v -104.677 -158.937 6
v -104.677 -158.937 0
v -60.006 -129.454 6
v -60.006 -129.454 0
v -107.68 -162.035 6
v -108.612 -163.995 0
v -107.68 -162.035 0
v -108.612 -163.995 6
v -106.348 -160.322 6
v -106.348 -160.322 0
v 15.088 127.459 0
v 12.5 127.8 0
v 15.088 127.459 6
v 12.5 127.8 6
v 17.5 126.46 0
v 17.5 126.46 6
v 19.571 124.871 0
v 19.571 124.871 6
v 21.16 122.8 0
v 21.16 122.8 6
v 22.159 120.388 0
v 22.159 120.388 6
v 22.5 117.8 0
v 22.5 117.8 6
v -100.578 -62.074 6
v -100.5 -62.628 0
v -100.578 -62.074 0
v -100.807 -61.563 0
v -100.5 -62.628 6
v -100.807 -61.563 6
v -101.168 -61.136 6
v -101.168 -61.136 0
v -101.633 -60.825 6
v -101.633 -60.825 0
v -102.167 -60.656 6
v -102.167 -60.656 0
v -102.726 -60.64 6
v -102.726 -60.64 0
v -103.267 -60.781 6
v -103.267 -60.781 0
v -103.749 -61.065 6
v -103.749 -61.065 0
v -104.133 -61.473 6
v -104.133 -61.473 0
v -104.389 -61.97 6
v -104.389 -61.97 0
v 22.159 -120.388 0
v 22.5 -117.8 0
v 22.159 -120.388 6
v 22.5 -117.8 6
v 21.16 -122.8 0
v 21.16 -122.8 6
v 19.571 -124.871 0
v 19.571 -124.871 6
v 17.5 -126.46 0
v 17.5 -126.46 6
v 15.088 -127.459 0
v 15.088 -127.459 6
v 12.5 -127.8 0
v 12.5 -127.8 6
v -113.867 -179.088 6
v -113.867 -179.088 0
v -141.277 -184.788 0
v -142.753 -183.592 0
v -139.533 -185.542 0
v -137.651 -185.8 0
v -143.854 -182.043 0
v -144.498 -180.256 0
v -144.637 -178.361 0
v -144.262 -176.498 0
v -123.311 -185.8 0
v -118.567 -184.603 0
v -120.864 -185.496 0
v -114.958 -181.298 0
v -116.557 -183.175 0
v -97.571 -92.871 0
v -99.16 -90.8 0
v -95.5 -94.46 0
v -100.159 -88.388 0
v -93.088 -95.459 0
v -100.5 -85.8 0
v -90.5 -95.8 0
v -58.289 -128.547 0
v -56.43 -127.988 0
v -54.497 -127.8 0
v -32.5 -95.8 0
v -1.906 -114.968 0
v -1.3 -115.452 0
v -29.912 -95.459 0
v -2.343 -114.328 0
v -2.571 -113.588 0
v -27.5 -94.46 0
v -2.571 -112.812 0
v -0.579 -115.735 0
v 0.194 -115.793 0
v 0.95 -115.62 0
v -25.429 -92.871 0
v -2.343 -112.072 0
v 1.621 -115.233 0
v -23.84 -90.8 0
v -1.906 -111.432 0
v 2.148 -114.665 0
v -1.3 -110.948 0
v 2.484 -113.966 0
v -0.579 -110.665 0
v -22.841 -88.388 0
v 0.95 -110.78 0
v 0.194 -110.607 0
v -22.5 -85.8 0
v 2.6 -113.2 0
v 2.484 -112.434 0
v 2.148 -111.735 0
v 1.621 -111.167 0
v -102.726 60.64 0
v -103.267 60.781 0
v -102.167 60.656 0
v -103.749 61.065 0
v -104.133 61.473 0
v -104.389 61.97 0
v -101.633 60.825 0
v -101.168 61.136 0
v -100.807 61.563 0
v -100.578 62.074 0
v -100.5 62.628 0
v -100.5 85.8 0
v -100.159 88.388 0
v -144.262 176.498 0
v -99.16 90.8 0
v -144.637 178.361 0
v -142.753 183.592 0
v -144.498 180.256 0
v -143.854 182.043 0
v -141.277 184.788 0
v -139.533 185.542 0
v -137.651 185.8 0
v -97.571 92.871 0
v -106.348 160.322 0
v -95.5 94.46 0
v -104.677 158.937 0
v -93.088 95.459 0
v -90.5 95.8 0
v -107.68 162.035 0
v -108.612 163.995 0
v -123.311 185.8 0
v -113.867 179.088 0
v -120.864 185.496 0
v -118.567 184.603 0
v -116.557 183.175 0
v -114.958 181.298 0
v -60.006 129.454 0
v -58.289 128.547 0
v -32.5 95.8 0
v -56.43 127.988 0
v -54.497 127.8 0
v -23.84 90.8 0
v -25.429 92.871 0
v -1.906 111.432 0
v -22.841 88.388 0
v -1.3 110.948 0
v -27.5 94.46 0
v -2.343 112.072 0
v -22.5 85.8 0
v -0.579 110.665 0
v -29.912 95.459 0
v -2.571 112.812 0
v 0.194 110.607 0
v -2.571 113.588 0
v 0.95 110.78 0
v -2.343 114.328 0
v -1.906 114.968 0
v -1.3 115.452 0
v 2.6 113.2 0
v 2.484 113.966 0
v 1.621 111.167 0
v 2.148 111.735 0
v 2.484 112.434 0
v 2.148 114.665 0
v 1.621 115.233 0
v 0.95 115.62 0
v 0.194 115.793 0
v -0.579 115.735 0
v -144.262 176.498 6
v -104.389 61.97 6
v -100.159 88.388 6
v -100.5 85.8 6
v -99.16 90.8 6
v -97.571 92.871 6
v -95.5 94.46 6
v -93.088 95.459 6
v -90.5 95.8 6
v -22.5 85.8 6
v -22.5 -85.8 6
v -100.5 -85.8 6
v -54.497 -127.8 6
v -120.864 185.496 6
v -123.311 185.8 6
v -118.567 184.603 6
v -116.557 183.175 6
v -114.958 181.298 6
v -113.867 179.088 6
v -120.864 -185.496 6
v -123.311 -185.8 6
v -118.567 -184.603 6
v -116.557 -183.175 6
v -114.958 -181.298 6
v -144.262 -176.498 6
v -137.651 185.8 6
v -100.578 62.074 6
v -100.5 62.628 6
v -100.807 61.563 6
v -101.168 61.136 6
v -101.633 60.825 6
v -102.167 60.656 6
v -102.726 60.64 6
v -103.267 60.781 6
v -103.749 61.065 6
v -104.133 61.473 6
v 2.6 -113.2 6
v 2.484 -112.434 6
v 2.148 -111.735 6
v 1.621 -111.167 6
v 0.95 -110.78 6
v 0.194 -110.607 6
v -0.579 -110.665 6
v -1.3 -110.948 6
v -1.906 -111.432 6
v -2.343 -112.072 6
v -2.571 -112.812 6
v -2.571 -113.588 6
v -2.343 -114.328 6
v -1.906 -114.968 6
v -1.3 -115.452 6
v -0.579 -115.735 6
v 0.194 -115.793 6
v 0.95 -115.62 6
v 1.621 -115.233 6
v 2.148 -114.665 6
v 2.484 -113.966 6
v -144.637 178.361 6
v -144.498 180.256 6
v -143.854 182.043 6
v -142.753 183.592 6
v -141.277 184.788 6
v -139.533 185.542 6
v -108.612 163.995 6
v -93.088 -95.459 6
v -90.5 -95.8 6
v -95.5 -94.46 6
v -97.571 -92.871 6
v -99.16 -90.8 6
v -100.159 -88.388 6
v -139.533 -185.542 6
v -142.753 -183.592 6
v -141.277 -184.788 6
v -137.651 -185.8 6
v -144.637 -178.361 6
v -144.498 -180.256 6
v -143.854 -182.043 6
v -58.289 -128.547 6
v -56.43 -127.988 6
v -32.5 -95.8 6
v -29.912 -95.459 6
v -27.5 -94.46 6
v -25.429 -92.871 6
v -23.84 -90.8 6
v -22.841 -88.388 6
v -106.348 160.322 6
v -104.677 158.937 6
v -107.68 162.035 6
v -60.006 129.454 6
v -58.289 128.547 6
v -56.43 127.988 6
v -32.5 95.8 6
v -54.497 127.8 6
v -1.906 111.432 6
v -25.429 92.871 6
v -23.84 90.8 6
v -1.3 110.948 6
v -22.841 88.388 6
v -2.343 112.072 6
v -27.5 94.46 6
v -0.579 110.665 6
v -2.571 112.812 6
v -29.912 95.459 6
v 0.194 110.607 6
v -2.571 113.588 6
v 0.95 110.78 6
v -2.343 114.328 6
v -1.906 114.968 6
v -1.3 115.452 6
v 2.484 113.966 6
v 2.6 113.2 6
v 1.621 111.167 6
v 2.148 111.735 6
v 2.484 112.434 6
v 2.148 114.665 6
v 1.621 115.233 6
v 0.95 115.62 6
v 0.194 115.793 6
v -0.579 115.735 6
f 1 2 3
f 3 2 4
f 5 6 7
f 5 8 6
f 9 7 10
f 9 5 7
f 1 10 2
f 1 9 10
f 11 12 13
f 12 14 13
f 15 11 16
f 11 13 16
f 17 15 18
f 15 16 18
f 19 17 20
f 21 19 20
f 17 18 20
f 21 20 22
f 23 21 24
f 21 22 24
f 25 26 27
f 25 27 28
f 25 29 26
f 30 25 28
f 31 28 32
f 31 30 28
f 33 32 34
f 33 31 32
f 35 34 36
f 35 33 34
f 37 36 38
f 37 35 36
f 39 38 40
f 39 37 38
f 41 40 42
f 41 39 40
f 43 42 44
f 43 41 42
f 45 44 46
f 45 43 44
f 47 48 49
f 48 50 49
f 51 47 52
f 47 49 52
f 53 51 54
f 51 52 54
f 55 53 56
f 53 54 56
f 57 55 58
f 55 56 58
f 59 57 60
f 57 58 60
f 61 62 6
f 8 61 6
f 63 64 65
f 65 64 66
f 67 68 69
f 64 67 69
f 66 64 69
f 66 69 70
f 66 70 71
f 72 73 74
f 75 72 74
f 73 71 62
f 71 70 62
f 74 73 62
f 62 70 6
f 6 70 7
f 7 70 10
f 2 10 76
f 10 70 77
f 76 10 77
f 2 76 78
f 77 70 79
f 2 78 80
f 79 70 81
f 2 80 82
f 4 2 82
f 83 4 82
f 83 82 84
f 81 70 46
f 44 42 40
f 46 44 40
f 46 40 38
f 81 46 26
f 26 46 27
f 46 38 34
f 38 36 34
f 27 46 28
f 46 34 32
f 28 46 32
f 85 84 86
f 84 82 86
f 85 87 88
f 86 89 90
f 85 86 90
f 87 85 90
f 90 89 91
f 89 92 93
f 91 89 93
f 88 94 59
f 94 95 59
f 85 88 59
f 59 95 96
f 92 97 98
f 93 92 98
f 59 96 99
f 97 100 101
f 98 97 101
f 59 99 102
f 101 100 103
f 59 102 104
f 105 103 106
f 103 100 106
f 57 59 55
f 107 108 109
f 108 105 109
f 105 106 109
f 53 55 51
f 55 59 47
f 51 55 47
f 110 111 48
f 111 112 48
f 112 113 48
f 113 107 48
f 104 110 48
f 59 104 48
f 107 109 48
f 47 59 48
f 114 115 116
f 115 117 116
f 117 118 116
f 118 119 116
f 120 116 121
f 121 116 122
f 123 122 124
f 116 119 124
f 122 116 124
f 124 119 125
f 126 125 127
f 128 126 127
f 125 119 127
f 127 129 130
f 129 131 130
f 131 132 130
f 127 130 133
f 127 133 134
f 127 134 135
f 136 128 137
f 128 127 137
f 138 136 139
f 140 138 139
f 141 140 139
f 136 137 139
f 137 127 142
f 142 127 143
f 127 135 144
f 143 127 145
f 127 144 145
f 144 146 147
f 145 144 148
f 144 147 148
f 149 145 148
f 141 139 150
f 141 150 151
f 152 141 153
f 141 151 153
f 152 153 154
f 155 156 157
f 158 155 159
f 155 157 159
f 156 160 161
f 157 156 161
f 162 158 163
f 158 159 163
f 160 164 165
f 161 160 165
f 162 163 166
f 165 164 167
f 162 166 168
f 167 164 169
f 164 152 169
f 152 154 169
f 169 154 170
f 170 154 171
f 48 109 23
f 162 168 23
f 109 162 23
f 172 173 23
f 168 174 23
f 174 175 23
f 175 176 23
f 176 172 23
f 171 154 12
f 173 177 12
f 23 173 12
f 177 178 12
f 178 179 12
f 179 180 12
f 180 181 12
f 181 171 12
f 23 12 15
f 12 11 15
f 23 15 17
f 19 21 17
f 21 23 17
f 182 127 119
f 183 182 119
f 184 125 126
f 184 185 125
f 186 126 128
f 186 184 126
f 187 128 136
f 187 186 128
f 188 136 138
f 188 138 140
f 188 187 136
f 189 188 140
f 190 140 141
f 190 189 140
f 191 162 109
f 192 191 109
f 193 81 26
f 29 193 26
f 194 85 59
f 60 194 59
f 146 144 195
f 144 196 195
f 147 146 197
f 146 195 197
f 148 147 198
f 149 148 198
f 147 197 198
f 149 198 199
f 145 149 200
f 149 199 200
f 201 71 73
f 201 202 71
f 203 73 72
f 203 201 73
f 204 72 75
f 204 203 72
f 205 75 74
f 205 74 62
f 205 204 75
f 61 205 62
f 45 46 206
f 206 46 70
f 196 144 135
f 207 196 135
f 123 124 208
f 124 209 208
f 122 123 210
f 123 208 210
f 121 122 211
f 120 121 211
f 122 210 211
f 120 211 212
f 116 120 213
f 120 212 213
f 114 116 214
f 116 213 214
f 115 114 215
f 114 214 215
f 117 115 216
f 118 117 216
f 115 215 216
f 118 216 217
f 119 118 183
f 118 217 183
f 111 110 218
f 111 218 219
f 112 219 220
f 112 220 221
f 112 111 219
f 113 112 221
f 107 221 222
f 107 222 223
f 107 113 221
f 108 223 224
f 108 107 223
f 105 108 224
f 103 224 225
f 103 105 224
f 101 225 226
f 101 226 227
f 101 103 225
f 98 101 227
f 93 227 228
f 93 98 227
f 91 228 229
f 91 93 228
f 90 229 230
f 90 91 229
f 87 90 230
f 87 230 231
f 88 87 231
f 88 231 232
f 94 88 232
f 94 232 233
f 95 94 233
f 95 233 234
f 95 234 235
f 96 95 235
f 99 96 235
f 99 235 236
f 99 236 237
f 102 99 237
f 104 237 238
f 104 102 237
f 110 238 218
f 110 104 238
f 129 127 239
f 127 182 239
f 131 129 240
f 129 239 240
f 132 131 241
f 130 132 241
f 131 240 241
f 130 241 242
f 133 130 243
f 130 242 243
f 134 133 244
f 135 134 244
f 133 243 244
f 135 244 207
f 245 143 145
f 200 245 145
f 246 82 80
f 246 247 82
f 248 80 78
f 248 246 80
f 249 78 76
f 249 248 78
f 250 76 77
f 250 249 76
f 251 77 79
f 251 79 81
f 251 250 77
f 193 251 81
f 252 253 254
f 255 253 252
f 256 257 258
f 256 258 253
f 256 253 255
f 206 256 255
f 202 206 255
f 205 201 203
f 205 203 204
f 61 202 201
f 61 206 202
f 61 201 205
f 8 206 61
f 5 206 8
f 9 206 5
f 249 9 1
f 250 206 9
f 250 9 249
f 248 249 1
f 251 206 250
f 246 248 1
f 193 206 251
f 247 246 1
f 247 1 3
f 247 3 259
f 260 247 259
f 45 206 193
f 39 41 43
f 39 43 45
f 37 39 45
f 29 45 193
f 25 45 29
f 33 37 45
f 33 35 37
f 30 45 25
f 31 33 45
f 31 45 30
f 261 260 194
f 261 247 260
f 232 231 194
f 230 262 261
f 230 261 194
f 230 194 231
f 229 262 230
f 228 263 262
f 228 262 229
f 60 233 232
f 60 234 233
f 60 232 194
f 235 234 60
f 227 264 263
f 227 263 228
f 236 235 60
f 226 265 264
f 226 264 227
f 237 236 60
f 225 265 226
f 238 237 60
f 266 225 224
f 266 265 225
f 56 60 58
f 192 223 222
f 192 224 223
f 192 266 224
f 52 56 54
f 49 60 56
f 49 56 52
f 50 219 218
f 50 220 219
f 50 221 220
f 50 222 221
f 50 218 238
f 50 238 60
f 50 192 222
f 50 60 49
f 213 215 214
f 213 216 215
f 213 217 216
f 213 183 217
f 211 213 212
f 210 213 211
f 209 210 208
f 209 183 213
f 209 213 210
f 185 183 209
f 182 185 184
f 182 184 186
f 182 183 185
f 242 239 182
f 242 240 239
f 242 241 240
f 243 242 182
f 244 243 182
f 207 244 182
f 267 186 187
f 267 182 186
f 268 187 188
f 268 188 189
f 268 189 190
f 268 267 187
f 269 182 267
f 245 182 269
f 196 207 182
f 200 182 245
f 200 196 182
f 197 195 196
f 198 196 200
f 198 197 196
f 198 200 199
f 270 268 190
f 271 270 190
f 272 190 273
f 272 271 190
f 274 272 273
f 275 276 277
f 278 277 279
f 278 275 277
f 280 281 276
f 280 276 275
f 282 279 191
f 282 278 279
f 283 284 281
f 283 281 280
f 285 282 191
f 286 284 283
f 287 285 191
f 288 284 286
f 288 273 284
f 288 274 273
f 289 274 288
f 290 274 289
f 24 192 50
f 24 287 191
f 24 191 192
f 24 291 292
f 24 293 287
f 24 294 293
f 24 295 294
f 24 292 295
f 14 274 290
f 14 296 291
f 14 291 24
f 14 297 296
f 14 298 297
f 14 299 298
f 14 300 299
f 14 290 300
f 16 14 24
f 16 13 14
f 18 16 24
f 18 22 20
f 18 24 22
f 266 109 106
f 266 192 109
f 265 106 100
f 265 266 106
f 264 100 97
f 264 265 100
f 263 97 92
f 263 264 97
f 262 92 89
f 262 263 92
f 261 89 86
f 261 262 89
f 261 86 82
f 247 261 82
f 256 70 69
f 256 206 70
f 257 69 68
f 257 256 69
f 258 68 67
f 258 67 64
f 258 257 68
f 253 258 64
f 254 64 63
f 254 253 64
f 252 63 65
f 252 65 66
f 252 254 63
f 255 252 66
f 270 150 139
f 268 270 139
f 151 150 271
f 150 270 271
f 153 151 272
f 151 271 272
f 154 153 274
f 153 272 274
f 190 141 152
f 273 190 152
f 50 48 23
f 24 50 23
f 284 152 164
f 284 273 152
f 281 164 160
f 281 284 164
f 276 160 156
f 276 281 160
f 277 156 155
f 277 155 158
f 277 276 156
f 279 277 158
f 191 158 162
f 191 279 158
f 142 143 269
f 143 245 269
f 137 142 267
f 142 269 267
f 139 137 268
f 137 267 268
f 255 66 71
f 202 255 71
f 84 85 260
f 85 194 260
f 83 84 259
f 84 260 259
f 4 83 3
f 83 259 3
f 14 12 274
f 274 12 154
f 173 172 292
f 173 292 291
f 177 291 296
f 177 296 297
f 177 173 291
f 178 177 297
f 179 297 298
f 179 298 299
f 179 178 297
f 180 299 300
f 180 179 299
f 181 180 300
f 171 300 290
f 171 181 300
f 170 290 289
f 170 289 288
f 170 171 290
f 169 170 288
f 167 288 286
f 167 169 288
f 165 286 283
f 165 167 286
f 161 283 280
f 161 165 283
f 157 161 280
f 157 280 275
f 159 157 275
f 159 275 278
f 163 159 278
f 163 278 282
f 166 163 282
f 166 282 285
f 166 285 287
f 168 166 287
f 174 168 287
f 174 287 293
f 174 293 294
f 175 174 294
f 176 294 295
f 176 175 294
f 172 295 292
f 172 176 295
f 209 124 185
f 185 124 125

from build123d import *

# Parameters (mm, degrees)
ESBO_O1_R                = 2.6
RESSALTO_EXTRUS_O1_DEPTH = 6
FILETE1_R                = 2
FILETE3_R                = 10
FILETE4_R                = 7


with BuildPart() as part:
    # Esboço1 → Ressalto-extrusão1 (new body)
    with BuildSketch(Plane.XY):
        Polygon((-100.5, 95.8), (-22.5, 95.8), (-22.5, -95.8), (-100.5, -95.8), (-100.5, -50.8), (-147.5, -185.8), (-116.203703704, -185.8), (-107.5, -160.8), (-57.5, -127.8), (22.5, -127.8), (22.5, 127.8), (-57.5, 127.8), (-107.5, 160.8), (-116.203703704, 185.8), (-147.5, 185.8), (-100.5, 50.8), align=None)
        with Locations((0, 113.2)):
            Circle(ESBO_O1_R, mode=Mode.SUBTRACT)
        with Locations((0, -113.2)):
            Circle(ESBO_O1_R, mode=Mode.SUBTRACT)
    extrude(amount=RESSALTO_EXTRUS_O1_DEPTH)

    # Filete1
    filete1_edges = [part.edges().sort_by_distance(p)[0] for p in [
        (-100.5, -50.8, 3),
        (-100.5, 50.8, 3),
    ]]
    fillet(filete1_edges, radius=FILETE1_R)

    # Filete3
    filete3_edges = [part.edges().sort_by_distance(p)[0] for p in [
        (-57.5, 127.8, 3),
        (22.5, 127.8, 3),
        (22.5, -127.8, 3),
        (-57.5, -127.8, 3),
        (-107.5, -160.8, 3),
        (-116.203703704, -185.8, 3),
        (-100.5, -95.8, 3),
        (-22.5, -95.8, 3),
        (-22.5, 95.8, 3),
        (-100.5, 95.8, 3),
        (-116.203703704, 185.8, 3),
        (-107.5, 160.8, 3),
    ]]
    fillet(filete3_edges, radius=FILETE3_R)

    # Filete4
    filete4_edges = [part.edges().sort_by_distance(p)[0] for p in [
        (-147.5, -185.8, 3),
        (-147.5, 185.8, 3),
    ]]
    fillet(filete4_edges, radius=FILETE4_R)


solid = part.part
